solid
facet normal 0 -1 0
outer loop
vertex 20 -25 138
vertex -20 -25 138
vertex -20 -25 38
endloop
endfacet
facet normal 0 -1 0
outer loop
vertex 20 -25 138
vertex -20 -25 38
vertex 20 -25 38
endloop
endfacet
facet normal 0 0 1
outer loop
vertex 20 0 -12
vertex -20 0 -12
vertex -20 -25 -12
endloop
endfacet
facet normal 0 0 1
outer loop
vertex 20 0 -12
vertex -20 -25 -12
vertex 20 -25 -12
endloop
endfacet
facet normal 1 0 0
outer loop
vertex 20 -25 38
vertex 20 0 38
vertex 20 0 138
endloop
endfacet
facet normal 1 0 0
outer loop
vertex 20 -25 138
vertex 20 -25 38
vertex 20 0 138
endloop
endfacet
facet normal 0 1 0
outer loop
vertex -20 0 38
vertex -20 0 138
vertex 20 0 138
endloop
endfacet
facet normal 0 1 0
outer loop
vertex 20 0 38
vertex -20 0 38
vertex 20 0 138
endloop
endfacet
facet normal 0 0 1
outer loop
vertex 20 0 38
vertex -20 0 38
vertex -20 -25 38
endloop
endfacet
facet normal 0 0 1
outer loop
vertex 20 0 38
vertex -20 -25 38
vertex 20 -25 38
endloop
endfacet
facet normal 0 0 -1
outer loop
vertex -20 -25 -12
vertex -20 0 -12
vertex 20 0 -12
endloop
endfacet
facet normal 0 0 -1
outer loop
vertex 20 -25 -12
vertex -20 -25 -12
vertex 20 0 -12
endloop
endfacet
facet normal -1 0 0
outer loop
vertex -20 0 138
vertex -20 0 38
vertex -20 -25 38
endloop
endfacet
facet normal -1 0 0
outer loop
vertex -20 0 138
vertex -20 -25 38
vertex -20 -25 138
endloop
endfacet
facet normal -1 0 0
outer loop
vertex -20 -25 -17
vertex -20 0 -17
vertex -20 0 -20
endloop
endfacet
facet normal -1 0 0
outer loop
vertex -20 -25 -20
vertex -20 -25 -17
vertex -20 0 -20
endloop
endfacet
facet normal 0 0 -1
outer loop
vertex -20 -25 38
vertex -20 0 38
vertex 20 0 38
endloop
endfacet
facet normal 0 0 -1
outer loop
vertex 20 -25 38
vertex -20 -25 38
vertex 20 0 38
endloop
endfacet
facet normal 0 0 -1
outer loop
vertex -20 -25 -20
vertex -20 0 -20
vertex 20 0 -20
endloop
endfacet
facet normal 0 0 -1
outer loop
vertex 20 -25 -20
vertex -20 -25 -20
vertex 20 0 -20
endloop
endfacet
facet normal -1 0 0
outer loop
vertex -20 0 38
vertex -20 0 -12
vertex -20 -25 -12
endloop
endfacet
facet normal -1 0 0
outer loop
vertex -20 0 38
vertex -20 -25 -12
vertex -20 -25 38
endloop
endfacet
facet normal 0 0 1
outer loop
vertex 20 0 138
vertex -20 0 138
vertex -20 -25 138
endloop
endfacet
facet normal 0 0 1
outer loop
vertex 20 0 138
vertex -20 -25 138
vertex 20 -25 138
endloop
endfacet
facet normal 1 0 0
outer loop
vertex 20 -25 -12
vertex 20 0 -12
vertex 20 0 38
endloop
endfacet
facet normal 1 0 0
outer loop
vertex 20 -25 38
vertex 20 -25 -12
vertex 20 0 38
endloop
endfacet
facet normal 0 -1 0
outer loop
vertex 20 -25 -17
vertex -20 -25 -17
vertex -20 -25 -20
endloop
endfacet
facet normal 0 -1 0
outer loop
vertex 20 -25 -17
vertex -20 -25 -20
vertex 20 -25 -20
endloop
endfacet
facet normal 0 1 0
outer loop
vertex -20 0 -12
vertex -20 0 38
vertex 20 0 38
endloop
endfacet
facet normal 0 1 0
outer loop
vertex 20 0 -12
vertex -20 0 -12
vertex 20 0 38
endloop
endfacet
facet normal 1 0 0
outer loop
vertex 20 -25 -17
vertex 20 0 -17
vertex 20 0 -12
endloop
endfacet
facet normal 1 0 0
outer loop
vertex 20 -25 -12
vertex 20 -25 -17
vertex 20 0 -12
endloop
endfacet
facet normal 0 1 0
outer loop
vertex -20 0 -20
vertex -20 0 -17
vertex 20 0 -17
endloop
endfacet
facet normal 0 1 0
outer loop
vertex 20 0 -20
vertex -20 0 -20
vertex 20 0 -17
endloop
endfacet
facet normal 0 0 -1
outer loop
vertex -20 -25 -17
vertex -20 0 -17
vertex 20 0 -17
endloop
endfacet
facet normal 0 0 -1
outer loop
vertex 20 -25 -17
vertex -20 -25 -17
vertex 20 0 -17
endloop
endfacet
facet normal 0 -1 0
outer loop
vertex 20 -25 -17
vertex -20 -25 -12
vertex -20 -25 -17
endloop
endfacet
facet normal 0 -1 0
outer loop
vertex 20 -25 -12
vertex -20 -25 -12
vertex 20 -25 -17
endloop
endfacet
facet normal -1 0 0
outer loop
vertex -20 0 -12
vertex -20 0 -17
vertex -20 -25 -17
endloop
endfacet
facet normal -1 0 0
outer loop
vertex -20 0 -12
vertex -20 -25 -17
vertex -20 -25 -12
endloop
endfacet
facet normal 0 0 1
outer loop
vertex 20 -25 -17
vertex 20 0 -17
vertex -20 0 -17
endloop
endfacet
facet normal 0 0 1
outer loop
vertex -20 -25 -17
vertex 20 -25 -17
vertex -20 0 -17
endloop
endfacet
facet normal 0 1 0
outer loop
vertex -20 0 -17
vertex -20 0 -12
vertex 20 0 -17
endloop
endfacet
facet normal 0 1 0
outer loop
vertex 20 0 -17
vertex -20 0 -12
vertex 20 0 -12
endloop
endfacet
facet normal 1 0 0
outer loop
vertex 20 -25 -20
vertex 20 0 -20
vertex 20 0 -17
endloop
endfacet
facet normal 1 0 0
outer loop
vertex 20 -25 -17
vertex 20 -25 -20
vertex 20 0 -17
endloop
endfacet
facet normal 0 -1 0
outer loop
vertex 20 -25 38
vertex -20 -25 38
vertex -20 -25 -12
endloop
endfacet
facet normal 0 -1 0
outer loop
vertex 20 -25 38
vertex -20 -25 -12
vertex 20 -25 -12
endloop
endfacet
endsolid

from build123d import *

# Parameters (mm, degrees)
F0_W     = 40
F0_H     = 100
F1_DEPTH = 25
F0_H_2   = 50
F2_DEPTH = 25
F0_H_3   = 5
F3_DEPTH = 25
F4_DEPTH = 25


with BuildPart() as f1:
    # F0 (on Front) → F1 (new body)
    with BuildSketch(Plane.XZ):
        with Locations((0, 88)):
            Rectangle(F0_W, F0_H)
    extrude(amount=F1_DEPTH)


with BuildPart() as f2:
    # F0 (on Front) → F2 (new body)
    with BuildSketch(Plane.XZ):
        with Locations((0, 13)):
            Rectangle(F0_W, F0_H_2)
    extrude(amount=F2_DEPTH)


with BuildPart() as f3:
    # F0 (on Front) → F3 (new body)
    with BuildSketch(Plane.XZ):
        with Locations((0, -14.5)):
            Rectangle(F0_W, F0_H_3)
    extrude(amount=F3_DEPTH)


with BuildPart() as f4:
    # F0 (on Front) → F4 (new body)
    with BuildSketch(Plane.XZ):
        Polygon((-20, -17), (-20, -20), (0, -20), (20, -20), (20, -17), align=None)
    extrude(amount=F4_DEPTH)


solid = Compound([f1.part, f2.part, f3.part, f4.part])
